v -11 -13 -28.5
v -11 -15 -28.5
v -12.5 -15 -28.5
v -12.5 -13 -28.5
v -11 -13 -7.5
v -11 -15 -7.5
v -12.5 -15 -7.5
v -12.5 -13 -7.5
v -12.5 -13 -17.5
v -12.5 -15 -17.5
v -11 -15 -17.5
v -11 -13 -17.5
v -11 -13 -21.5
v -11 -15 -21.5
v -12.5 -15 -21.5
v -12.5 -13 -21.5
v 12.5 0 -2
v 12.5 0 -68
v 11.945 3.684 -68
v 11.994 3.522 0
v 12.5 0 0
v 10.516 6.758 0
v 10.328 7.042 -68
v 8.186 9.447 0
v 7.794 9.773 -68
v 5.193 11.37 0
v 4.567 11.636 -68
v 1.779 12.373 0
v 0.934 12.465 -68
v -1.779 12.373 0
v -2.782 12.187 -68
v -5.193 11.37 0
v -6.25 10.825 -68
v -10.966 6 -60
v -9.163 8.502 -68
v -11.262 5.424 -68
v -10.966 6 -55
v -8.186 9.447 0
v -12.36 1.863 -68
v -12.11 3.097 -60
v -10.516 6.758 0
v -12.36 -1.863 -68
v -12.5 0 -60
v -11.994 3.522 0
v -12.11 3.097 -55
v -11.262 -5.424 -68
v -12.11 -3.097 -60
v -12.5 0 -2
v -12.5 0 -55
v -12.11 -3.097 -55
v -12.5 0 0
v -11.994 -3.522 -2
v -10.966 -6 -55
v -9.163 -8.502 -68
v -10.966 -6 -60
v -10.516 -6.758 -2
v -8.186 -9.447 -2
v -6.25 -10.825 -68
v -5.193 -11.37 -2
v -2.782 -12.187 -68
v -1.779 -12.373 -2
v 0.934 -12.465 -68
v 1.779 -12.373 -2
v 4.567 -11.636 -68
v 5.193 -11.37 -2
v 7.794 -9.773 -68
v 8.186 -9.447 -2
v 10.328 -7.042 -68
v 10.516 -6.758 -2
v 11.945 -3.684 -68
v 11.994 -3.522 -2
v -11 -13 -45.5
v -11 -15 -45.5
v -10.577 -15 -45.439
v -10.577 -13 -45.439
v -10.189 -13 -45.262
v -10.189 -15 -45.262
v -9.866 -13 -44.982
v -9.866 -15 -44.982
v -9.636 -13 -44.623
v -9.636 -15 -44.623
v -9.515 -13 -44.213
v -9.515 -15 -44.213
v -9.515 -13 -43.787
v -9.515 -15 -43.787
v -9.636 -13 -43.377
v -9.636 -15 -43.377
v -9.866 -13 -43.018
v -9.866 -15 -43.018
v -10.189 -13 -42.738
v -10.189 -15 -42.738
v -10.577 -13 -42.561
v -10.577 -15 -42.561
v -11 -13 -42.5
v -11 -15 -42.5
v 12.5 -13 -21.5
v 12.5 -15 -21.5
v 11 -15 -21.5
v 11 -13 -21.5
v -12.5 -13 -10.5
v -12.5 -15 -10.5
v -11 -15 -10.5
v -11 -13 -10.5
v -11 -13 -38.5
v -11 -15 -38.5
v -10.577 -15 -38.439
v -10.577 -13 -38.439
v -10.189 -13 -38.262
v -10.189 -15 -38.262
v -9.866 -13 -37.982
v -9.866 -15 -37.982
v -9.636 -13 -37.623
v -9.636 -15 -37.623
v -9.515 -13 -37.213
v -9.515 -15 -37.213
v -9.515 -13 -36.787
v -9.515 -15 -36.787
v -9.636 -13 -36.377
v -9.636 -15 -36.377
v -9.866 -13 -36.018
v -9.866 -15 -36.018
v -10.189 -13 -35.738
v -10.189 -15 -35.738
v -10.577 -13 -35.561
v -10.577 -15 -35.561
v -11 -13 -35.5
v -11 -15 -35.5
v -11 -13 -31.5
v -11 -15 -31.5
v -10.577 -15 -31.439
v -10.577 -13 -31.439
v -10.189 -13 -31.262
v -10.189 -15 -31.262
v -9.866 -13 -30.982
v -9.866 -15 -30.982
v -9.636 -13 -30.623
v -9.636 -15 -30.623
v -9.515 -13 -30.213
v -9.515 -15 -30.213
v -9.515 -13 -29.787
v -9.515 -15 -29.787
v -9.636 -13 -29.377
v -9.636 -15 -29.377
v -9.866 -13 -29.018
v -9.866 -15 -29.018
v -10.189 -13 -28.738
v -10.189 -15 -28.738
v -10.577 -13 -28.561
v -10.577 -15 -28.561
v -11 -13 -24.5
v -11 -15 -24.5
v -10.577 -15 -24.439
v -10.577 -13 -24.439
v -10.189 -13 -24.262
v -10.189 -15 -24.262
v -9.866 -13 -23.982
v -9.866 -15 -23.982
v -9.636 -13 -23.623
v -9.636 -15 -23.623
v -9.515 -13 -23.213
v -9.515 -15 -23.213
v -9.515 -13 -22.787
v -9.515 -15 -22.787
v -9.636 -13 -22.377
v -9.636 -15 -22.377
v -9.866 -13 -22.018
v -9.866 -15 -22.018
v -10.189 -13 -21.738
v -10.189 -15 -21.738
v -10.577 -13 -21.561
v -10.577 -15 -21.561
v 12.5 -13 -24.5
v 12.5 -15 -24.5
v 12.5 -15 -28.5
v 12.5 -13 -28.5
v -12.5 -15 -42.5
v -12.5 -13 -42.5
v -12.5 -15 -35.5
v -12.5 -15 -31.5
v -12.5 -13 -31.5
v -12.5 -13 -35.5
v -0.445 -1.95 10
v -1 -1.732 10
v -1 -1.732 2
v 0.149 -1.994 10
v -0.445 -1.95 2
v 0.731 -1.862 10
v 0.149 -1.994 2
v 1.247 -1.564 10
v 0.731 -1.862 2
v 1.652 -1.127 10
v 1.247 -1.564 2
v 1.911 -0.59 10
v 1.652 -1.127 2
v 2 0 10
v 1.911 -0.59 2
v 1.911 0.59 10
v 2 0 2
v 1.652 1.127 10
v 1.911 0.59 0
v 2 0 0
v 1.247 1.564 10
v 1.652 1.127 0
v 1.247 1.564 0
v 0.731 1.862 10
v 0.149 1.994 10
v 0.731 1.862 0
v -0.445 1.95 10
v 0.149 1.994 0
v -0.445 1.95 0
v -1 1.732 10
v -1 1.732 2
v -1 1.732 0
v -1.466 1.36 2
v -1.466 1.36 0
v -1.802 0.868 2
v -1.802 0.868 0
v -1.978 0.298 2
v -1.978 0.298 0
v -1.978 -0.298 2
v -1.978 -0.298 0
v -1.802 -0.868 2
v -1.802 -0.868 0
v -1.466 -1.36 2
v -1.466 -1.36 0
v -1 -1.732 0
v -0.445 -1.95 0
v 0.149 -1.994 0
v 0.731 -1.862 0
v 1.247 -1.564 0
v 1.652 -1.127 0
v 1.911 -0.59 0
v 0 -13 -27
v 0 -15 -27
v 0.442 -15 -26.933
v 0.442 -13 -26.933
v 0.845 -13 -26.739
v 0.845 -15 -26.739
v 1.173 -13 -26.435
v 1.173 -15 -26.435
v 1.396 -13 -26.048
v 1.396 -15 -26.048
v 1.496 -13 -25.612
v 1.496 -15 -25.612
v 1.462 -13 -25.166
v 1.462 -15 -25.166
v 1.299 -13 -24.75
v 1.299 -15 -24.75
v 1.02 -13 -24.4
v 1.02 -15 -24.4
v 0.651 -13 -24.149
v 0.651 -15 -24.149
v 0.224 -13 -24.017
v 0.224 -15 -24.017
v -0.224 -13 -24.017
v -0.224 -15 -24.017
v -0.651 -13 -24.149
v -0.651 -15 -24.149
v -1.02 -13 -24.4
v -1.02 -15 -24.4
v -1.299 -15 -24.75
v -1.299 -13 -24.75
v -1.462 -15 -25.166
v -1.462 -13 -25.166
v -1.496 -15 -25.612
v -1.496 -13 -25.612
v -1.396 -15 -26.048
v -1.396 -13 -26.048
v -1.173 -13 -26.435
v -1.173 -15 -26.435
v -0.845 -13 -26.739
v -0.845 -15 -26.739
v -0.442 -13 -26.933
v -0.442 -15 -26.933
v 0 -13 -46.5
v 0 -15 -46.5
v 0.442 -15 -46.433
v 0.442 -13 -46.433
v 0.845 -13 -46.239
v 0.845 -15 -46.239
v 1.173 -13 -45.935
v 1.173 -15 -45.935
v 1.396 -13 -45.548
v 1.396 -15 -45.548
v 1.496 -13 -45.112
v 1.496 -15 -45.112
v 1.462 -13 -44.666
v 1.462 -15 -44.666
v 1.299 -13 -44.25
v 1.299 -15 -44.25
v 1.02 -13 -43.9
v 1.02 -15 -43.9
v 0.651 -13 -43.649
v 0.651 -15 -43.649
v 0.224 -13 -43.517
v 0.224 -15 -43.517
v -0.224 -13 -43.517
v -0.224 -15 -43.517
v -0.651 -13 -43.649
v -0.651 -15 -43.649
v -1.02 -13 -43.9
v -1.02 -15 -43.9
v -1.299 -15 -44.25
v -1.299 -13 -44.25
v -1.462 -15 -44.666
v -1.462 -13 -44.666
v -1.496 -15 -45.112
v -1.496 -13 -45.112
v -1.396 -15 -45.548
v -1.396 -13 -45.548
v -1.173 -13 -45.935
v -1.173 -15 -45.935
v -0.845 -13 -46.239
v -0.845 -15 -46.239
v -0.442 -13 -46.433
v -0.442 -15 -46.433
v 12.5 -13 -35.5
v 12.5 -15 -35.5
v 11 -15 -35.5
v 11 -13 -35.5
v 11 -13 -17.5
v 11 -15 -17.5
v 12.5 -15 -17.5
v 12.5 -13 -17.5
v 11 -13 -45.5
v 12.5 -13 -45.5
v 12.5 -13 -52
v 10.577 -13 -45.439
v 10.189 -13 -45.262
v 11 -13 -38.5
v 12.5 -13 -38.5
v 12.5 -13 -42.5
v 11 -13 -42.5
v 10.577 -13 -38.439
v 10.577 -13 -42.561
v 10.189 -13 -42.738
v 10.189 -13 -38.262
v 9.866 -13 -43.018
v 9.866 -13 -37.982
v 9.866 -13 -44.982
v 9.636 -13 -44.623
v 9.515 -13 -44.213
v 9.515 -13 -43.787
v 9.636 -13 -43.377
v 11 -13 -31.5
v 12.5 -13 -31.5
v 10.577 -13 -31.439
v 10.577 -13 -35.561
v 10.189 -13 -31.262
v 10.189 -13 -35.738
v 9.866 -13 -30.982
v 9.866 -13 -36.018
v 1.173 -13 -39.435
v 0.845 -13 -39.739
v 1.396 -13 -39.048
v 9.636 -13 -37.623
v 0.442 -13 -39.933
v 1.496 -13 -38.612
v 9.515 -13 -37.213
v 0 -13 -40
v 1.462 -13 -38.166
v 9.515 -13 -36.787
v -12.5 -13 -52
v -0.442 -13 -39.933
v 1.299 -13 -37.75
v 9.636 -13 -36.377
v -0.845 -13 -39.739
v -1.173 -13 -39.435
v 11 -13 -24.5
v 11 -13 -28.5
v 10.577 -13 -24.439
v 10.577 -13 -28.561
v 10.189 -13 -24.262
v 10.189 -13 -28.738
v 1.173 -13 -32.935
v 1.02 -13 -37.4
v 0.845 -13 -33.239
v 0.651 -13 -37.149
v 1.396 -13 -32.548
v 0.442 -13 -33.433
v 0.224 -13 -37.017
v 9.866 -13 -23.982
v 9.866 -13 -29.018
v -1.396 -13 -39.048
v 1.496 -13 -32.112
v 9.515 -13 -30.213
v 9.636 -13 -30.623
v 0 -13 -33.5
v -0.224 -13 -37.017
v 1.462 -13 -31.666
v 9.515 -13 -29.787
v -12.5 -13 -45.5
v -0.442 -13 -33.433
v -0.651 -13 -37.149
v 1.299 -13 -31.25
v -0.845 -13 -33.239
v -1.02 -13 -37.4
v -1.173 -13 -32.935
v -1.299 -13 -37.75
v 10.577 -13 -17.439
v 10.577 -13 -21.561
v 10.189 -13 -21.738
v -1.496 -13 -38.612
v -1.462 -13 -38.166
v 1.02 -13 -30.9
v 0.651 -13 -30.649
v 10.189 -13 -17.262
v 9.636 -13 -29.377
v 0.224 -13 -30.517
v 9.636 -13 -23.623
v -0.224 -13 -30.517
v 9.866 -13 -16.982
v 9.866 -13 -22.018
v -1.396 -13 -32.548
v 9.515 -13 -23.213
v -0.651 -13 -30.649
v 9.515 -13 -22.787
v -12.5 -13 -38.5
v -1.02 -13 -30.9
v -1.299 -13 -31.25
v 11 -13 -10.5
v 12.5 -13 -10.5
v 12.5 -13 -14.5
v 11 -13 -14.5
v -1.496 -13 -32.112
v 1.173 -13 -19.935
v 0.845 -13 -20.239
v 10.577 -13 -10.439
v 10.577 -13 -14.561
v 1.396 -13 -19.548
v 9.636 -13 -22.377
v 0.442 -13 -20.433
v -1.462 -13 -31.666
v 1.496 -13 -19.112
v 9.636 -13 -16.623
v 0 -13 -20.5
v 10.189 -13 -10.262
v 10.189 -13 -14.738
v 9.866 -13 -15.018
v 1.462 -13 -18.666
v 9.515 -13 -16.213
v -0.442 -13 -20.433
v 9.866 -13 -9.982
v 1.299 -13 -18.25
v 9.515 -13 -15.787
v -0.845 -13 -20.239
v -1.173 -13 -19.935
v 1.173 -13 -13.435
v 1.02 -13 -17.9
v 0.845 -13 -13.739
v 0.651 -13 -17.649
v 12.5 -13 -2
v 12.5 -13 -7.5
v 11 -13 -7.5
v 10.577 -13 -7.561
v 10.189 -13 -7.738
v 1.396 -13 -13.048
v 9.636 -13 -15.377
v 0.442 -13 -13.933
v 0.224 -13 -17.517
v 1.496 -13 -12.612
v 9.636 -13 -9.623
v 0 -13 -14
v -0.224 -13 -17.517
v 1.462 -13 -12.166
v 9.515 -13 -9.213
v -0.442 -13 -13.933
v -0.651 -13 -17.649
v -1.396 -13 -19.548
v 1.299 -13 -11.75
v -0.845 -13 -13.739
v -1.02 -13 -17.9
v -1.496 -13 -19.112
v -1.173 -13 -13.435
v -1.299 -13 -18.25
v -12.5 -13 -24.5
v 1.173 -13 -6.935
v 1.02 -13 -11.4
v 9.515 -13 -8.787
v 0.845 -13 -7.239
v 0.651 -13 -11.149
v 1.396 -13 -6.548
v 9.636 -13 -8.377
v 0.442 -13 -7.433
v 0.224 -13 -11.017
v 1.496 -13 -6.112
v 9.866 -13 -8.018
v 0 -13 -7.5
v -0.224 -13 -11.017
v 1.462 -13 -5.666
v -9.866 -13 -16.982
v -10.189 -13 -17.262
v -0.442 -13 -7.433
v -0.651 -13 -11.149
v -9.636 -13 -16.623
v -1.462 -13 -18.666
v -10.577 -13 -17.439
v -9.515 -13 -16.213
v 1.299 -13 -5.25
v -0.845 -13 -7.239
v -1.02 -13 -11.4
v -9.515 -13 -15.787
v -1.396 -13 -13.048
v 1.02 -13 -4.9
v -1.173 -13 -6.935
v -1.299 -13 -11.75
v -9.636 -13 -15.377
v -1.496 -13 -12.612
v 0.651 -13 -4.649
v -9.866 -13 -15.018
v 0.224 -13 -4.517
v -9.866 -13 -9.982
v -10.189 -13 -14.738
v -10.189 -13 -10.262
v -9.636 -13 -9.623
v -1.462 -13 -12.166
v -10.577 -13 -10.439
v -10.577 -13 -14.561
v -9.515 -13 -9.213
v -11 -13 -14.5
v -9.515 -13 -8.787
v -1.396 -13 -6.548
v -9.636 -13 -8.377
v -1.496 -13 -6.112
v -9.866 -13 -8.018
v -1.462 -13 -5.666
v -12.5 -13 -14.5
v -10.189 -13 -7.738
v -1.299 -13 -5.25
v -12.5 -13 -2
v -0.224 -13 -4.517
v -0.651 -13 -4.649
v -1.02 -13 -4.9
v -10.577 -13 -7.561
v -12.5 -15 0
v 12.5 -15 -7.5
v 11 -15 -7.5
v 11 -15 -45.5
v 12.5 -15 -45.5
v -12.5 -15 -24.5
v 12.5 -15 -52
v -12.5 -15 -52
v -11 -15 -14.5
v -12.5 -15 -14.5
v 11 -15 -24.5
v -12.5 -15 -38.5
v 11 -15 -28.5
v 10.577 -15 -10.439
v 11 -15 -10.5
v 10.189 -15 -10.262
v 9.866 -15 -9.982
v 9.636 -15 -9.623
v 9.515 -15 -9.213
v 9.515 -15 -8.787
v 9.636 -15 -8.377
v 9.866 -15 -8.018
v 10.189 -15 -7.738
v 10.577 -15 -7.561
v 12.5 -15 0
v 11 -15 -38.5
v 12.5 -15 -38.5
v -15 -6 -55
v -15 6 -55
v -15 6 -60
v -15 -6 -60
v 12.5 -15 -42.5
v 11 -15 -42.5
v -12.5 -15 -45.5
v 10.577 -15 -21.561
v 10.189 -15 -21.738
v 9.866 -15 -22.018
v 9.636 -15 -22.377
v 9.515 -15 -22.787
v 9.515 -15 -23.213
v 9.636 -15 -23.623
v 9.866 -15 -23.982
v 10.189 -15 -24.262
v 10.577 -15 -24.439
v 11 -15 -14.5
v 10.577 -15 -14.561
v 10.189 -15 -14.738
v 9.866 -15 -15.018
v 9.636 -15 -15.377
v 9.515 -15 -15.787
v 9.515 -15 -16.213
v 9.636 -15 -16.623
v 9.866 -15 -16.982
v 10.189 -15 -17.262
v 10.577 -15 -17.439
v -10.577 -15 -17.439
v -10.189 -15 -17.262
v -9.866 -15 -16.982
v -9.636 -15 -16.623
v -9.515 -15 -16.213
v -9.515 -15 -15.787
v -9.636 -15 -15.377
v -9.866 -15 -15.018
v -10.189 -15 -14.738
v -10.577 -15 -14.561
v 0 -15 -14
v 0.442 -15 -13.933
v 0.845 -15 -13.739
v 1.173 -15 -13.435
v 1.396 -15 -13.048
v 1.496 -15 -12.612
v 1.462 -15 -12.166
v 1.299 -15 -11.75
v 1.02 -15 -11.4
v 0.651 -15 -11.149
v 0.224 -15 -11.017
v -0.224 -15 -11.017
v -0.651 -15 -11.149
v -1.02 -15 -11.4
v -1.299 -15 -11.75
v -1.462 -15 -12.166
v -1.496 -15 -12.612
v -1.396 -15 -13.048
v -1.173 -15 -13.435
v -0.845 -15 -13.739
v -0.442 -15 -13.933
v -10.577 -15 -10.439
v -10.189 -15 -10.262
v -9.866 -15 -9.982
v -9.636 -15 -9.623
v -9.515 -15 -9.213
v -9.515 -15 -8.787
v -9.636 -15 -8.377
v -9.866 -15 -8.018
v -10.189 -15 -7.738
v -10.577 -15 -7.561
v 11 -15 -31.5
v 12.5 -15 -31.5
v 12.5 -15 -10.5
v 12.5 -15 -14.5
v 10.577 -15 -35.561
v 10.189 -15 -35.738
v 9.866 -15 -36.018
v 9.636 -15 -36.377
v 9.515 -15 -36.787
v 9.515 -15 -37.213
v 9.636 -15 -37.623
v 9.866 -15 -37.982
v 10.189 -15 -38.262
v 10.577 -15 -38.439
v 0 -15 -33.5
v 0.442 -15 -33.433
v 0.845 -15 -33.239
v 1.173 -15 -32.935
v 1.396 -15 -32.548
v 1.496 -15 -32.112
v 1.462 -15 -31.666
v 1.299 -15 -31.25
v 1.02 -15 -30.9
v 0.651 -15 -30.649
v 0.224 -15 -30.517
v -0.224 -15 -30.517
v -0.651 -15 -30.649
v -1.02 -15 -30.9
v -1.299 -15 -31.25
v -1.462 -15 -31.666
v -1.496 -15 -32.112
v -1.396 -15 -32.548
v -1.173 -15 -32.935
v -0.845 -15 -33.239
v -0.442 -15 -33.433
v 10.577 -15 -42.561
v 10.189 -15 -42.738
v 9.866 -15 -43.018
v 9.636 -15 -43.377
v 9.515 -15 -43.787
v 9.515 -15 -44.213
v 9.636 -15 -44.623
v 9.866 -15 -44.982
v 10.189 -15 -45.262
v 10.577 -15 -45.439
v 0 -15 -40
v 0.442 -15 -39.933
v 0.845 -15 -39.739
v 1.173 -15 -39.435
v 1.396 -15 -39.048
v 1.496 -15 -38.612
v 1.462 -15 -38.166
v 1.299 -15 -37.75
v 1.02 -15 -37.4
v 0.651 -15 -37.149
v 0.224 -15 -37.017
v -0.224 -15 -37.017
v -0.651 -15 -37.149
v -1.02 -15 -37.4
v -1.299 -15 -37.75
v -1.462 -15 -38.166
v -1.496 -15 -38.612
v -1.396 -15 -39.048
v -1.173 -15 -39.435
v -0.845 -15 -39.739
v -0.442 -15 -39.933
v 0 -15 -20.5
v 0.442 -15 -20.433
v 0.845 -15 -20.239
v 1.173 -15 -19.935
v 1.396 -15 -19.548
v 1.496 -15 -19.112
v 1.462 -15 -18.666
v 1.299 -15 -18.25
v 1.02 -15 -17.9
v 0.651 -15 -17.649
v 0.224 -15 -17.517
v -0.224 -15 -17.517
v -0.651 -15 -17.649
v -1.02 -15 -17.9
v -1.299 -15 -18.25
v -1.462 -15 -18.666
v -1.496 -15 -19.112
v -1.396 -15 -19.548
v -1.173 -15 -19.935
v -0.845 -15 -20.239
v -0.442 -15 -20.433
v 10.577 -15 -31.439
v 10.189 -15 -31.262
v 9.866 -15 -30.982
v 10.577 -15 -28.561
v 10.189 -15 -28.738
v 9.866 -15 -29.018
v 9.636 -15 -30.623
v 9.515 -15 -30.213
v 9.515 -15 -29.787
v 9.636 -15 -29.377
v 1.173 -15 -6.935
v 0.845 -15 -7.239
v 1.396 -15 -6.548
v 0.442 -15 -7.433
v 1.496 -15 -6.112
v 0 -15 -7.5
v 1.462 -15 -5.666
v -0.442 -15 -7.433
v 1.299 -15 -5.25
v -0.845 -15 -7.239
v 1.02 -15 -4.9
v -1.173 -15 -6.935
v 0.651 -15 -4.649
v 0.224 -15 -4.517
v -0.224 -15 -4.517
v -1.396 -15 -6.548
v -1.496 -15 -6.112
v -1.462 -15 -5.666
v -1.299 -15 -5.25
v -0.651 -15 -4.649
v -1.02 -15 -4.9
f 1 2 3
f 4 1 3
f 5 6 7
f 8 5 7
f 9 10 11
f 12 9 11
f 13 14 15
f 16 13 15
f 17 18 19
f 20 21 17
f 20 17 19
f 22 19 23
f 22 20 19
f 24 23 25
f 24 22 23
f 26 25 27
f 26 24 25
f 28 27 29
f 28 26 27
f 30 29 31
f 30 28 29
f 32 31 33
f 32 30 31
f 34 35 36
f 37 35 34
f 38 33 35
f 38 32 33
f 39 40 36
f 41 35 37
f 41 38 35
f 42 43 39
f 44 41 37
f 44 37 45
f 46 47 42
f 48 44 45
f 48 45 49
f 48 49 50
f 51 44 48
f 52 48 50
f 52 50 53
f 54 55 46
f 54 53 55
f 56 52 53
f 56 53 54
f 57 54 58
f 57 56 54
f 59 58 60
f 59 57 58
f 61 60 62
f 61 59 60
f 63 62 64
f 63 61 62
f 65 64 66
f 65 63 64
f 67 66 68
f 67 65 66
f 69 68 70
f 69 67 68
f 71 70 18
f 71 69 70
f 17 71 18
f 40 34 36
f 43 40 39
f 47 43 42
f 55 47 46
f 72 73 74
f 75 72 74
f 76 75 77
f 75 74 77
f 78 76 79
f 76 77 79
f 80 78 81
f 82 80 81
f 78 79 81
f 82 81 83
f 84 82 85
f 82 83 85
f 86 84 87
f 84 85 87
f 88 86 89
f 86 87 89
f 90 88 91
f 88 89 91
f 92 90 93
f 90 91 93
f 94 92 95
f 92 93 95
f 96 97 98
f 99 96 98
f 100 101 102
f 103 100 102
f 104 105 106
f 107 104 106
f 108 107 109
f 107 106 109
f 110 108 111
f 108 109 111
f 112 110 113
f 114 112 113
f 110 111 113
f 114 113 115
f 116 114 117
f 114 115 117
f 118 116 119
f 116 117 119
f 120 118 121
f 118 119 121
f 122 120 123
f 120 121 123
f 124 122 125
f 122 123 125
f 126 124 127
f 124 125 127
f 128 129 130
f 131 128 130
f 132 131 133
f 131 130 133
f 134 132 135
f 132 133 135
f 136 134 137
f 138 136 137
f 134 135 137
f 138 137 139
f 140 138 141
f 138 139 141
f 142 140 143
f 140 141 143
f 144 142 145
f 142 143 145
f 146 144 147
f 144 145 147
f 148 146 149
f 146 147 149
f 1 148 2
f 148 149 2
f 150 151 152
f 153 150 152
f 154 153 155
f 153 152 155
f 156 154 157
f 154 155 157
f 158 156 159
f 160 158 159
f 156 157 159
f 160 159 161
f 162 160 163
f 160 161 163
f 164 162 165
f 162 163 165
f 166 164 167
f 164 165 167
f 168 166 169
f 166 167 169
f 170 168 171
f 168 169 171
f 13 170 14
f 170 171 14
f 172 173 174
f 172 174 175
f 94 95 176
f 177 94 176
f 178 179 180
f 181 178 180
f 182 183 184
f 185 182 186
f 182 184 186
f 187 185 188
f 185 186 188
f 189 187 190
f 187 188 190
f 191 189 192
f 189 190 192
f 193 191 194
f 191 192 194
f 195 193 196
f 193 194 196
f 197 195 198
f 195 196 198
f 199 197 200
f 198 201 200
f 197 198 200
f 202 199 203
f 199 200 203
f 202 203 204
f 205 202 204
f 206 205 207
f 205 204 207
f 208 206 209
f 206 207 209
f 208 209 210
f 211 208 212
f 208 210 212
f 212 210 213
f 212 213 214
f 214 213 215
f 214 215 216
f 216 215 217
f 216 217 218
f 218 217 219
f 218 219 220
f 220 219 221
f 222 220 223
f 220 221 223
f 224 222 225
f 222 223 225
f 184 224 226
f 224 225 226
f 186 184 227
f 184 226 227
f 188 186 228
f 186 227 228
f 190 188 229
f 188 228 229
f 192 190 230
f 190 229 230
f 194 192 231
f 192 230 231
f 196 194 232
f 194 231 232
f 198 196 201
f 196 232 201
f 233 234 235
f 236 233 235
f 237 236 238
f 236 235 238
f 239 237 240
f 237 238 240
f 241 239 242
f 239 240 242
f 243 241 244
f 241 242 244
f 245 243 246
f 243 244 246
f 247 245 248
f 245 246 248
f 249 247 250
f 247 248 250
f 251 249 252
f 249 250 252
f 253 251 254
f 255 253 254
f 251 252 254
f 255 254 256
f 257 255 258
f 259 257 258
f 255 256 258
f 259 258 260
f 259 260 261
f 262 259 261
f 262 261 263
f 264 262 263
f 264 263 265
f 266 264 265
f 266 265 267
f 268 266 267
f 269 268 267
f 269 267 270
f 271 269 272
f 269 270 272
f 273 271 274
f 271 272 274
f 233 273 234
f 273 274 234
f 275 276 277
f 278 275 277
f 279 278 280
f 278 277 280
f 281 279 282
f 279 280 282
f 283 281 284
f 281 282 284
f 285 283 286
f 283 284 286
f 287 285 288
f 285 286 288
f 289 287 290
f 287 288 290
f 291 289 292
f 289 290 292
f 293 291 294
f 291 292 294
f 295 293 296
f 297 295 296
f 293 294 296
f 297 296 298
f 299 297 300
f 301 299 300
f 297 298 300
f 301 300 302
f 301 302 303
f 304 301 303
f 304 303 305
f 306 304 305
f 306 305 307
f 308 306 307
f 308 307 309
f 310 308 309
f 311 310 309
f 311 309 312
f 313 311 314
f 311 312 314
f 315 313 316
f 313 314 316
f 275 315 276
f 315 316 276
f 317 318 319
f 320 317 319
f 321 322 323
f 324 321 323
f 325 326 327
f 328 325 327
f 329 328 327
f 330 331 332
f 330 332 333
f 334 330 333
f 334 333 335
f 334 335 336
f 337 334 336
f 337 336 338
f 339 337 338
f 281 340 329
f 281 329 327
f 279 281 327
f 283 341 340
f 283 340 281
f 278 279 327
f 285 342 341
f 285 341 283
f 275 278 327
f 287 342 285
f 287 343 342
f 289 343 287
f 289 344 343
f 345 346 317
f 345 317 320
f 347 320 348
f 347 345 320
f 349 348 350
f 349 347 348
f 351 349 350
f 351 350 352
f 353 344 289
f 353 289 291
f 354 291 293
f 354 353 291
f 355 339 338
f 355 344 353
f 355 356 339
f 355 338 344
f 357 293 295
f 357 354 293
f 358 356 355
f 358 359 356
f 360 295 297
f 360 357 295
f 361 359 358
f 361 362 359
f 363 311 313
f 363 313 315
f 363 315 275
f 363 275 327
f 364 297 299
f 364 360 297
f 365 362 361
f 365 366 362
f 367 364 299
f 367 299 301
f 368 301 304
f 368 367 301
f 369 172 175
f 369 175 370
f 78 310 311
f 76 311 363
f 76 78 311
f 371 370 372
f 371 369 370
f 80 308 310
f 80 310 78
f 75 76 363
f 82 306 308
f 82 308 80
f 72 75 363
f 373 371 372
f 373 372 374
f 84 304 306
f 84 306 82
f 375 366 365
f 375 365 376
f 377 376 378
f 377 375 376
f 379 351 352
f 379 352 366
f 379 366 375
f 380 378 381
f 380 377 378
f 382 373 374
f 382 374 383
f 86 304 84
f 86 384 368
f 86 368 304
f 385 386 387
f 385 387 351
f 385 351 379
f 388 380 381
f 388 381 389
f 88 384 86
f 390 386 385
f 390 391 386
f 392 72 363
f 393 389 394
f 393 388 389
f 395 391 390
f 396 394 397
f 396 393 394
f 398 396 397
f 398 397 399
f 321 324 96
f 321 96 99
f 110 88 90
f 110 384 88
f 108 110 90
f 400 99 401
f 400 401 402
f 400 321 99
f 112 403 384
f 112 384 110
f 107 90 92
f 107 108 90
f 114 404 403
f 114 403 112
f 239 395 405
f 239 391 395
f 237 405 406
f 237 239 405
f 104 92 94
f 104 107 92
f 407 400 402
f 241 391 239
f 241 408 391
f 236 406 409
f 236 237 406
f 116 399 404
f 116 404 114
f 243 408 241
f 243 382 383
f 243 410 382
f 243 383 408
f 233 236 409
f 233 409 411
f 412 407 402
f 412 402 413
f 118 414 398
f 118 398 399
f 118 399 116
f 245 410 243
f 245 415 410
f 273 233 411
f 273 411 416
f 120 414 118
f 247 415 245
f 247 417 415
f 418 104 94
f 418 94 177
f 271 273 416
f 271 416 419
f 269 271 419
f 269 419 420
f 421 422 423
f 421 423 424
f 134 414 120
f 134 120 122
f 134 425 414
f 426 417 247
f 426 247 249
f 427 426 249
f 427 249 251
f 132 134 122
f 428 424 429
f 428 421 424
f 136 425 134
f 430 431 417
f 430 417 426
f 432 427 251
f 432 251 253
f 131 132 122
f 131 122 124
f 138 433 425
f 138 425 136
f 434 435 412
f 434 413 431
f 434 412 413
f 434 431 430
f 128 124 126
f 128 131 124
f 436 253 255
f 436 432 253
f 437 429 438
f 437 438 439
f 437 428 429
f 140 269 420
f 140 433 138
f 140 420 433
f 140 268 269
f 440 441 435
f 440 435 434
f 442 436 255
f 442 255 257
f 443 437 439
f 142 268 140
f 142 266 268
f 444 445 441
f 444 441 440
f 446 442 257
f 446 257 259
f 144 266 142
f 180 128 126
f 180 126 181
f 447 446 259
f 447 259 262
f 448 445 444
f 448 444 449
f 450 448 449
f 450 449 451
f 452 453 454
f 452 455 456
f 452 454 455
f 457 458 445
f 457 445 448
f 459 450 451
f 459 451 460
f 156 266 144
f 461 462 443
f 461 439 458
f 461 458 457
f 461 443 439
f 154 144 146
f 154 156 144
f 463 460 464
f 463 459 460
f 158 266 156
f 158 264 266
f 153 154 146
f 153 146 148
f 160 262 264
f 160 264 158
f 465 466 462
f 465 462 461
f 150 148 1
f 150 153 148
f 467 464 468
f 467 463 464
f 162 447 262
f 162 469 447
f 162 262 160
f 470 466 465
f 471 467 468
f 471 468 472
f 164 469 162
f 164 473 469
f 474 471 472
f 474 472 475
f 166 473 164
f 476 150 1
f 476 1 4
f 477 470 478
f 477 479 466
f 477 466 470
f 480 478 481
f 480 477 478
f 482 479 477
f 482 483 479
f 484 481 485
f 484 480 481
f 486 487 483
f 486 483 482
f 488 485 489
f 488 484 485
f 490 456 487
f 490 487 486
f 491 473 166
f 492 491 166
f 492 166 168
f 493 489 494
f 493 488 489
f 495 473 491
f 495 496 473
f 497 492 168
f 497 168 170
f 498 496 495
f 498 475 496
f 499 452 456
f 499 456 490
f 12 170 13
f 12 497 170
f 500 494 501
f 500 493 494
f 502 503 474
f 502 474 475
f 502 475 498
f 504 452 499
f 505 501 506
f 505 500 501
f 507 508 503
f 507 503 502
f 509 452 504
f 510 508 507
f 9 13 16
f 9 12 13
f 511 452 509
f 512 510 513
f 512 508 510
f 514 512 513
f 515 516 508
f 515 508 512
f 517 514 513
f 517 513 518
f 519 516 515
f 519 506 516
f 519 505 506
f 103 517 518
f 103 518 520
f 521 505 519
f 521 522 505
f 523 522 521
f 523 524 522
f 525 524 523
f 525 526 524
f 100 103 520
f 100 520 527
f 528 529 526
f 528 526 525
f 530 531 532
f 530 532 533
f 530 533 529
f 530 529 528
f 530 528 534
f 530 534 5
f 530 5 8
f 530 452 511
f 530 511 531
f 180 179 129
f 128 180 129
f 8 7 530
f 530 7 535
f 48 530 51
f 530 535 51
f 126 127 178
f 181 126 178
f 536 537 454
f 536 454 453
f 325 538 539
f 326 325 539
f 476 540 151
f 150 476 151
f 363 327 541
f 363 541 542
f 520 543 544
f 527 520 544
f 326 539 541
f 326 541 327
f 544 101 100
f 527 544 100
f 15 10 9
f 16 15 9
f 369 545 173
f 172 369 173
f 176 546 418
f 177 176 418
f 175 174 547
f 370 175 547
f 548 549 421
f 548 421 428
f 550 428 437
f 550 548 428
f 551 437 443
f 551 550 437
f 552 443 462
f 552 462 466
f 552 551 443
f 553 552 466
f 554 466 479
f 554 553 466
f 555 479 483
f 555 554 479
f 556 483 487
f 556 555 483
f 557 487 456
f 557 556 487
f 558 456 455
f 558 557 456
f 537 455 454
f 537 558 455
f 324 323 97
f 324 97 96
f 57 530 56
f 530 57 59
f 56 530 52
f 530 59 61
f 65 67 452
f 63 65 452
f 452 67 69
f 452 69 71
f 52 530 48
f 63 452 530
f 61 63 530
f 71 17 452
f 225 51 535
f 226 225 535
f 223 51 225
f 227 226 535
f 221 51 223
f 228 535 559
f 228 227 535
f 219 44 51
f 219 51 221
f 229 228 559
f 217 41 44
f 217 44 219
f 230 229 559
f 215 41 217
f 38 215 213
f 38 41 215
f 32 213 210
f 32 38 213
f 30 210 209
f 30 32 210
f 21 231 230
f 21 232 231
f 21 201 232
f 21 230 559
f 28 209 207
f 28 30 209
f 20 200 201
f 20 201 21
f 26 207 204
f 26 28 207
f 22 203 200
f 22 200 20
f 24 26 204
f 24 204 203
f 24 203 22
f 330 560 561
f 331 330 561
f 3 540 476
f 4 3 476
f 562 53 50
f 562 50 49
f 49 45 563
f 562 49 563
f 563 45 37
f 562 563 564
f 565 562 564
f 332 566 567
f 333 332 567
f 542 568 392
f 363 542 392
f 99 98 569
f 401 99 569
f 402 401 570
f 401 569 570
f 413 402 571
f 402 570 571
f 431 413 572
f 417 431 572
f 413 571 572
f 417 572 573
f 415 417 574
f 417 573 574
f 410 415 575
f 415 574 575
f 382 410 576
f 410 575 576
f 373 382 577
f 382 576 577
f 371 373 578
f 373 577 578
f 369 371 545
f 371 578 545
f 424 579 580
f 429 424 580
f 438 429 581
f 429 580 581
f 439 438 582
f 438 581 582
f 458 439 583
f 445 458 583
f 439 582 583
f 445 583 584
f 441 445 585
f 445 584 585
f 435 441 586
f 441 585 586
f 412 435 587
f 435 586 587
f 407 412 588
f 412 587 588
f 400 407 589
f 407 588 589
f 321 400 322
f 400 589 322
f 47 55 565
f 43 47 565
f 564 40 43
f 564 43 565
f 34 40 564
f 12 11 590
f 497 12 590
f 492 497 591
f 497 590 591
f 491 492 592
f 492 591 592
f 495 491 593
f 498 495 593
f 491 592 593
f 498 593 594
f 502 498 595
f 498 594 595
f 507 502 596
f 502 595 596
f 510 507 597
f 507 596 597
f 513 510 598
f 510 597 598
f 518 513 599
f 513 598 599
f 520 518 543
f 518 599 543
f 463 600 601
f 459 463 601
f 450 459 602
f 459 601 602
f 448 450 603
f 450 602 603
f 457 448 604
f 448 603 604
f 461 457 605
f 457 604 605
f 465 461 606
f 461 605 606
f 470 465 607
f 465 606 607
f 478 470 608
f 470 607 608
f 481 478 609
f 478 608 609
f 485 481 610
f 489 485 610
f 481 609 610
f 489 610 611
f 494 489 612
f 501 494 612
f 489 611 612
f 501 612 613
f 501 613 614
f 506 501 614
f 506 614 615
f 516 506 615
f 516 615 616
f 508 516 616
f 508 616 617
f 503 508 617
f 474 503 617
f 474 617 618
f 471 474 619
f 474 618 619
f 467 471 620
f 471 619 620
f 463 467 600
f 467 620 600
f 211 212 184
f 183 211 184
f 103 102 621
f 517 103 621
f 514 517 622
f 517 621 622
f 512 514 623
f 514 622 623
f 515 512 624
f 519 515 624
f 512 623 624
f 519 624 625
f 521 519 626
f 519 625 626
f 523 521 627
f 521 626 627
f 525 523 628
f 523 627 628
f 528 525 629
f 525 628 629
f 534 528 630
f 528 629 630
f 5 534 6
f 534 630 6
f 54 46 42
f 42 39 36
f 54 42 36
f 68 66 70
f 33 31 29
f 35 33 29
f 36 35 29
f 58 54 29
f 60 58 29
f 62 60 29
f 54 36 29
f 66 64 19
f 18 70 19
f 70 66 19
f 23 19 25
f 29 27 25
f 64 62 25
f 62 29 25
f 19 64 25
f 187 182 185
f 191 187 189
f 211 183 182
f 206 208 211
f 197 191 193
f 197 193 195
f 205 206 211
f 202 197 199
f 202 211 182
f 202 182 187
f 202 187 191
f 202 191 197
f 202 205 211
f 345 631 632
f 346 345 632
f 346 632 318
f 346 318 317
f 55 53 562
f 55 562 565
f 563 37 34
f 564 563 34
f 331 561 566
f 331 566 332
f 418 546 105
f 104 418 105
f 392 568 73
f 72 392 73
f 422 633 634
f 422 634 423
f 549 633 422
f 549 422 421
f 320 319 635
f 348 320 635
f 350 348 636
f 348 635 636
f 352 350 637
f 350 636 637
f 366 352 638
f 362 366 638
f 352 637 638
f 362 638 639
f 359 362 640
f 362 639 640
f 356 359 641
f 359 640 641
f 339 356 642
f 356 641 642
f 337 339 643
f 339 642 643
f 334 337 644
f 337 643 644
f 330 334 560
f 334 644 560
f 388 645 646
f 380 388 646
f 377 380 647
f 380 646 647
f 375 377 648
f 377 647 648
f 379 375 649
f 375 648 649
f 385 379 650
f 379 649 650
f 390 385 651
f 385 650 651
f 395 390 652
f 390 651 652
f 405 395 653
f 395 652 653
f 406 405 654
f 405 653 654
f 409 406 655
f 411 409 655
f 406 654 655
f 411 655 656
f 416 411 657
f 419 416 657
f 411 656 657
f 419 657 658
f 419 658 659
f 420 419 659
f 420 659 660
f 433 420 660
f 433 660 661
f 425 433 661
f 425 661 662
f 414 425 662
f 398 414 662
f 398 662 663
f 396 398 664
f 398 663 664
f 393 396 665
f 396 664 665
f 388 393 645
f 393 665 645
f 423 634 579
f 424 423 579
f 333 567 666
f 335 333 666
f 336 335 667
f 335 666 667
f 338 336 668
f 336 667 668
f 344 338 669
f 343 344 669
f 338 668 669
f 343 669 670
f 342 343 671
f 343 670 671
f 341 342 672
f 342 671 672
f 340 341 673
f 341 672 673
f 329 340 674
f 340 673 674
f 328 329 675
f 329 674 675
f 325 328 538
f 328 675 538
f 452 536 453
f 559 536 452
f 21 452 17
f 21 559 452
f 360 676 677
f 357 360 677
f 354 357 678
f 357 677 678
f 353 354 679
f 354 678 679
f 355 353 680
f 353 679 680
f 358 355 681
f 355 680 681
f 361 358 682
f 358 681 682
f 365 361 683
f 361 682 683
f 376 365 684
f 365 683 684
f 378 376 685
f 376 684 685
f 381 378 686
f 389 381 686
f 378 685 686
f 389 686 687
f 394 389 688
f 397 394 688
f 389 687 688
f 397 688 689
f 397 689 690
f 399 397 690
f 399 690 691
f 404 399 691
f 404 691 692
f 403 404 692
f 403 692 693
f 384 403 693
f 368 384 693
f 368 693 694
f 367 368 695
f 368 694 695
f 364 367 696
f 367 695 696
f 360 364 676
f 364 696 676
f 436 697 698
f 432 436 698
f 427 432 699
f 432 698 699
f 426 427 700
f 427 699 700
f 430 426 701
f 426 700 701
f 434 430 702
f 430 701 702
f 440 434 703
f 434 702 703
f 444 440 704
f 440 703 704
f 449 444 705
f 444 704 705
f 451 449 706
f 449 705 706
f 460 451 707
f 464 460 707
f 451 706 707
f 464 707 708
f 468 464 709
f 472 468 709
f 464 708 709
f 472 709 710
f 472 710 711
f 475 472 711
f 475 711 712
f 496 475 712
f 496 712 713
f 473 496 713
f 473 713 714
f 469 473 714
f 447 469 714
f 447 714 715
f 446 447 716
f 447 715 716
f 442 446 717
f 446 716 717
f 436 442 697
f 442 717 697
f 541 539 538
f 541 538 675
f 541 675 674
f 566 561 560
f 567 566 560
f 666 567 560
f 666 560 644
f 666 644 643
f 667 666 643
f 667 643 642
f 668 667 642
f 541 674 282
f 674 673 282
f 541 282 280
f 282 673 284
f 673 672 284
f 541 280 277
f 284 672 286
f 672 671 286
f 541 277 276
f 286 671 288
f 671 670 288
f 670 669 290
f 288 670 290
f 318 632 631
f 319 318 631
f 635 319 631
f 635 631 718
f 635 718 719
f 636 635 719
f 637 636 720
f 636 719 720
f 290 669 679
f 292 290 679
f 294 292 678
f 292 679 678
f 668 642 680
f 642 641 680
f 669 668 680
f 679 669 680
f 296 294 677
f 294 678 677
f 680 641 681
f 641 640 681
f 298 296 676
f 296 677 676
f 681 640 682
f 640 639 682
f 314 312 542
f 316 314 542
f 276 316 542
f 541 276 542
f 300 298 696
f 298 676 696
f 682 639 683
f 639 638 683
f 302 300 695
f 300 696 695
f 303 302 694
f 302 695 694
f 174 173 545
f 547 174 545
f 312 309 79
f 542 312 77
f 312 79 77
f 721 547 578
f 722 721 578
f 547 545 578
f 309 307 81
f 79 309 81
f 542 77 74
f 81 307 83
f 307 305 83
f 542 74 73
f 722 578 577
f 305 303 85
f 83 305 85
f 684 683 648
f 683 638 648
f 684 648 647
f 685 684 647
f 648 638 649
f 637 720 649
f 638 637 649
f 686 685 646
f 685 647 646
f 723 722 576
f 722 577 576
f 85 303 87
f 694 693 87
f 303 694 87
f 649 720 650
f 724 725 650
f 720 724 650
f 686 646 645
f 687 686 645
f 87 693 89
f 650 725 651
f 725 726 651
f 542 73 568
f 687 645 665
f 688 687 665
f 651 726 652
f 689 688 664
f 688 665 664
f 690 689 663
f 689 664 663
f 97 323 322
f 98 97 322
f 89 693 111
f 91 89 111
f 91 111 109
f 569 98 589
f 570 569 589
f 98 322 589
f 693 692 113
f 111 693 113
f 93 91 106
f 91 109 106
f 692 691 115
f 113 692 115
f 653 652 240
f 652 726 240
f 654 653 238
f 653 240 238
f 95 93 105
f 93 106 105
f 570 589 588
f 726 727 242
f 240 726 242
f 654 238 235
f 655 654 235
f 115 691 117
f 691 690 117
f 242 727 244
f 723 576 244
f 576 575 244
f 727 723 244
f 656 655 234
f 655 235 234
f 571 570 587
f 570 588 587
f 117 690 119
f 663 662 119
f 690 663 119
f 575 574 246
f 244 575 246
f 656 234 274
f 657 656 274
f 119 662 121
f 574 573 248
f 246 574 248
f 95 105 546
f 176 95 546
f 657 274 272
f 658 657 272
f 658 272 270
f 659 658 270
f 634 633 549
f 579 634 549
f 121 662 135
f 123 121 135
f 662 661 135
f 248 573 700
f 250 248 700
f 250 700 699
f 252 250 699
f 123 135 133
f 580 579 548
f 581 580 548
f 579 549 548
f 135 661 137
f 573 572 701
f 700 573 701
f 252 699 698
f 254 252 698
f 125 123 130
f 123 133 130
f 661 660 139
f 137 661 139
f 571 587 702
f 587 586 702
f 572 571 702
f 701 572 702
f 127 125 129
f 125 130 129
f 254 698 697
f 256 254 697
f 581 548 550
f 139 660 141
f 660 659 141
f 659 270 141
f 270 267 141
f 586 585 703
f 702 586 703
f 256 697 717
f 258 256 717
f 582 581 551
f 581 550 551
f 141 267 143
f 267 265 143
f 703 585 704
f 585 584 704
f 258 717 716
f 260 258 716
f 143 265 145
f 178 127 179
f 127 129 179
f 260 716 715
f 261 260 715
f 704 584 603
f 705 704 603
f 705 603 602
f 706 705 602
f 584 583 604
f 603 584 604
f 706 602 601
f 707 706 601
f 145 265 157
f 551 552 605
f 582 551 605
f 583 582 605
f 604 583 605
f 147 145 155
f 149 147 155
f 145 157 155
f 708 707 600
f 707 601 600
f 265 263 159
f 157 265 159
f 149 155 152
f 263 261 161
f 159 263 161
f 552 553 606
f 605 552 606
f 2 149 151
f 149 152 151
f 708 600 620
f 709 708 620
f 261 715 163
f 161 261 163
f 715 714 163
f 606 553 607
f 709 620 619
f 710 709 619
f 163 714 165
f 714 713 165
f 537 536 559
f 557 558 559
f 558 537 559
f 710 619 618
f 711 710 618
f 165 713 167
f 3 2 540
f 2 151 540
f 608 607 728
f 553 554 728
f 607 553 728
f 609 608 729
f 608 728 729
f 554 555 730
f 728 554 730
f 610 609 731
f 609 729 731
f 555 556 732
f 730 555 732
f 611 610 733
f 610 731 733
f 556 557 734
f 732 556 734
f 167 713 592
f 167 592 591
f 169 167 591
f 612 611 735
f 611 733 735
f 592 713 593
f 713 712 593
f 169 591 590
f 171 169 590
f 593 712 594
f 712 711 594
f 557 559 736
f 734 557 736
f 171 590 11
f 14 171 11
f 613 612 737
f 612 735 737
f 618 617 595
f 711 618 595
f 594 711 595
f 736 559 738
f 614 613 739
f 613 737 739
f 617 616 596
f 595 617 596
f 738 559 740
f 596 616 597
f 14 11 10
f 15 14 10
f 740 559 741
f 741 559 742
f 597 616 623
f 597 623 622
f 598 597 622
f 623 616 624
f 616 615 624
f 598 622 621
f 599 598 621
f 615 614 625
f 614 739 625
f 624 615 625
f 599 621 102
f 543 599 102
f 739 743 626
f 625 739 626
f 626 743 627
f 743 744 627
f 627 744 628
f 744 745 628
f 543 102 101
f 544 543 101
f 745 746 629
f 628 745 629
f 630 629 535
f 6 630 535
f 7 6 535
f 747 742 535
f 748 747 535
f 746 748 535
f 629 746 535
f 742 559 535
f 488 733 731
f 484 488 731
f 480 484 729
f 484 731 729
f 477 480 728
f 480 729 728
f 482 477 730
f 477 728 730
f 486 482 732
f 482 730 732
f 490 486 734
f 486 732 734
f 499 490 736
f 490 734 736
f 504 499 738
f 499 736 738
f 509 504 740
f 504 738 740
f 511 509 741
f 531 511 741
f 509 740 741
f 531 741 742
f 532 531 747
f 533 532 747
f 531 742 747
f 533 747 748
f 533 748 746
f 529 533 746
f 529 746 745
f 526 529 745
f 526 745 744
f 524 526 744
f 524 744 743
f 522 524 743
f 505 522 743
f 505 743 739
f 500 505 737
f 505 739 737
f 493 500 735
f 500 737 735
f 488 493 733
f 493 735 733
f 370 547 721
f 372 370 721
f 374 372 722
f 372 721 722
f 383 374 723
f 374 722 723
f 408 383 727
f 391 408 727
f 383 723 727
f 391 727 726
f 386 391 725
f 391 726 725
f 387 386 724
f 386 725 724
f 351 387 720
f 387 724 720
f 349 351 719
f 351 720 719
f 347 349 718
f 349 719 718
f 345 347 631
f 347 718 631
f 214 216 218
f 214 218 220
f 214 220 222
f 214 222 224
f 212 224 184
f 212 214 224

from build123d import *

# Parameters (mm, degrees)
SKETCH1_R           = 12.5
BOSS_EXTRUDE1_DEPTH = 68
SKETCH3_R           = 2
BOSS_EXTRUDE3_DEPTH = 2
BOSS_EXTRUDE2_DEPTH = 8
BOSS_EXTRUDE4_DEPTH = 2
SKETCH5_W           = 25
SKETCH5_H           = 2
BOSS_EXTRUDE5_DEPTH = 50
SKETCH6_R           = 1.5
CUT_EXTRUDE1_DEPTH  = 2
SKETCH7_W           = 5
SKETCH7_H           = 12
BOSS_EXTRUDE6_DEPTH = 15


with BuildPart() as part:
    # Sketch1 → Boss-Extrude1 (new body)
    with BuildSketch(Plane.XY):
        Circle(SKETCH1_R)
    extrude(amount=-BOSS_EXTRUDE1_DEPTH)

    # Sketch3 → Boss-Extrude3 (add)
    with BuildSketch(Plane.XY):
        Circle(SKETCH3_R)
    extrude(amount=BOSS_EXTRUDE3_DEPTH)

    # Sketch2 → Boss-Extrude2 (add)
    with BuildSketch(Plane.XY.offset(2)):
        with BuildLine():
            Line((-1, 1.732050808), (-1, -1.732050808))
            ThreePointArc((-1, -1.732050808), (2, 0), (-1, 1.732050808))
        make_face()
    extrude(amount=BOSS_EXTRUDE2_DEPTH)

    # Sketch4 → Boss-Extrude4 (add)
    with BuildSketch(Plane.XY):
        with BuildLine():
            Line((-12.5, 0), (-12.5, -15))
            Line((-12.5, -15), (12.5, -15))
            Line((12.5, -15), (12.5, 0))
            ThreePointArc((12.5, 0), (0, -12.5), (-12.5, 0))
        make_face()
    extrude(amount=-BOSS_EXTRUDE4_DEPTH)

    # Sketch5 → Boss-Extrude5 (add)
    with BuildSketch(Plane(origin=(0, 0, -2), x_dir=(-1, 0, 0), z_dir=(0, 0, -1))):
        with Locations((0, -14)):
            Rectangle(SKETCH5_W, SKETCH5_H)
    extrude(amount=BOSS_EXTRUDE5_DEPTH)

    # Sketch6 → Cut-Extrude1 (cut)
    with BuildSketch(Plane.XZ.offset(15)):
        with Locations(Location((0, -6, 0), (0, 0, 270))):
            Circle(SKETCH6_R)
        with Locations(Location((0, -12.5, 0), (0, 0, 270))):
            Circle(SKETCH6_R)
        with Locations(Location((0, -19, 0), (0, 0, 270))):
            Circle(SKETCH6_R)
        with Locations(Location((0, -25.5, 0), (0, 0, 270))):
            Circle(SKETCH6_R)
        with Locations(Location((0, -32, 0), (0, 0, 270))):
            Circle(SKETCH6_R)
        with Locations(Location((0, -38.5, 0), (0, 0, 270))):
            Circle(SKETCH6_R)
        with Locations(Location((0, -45, 0), (0, 0, 270))):
            Circle(SKETCH6_R)
        with BuildLine():
            Line((-11, -7.5), (-12.5, -7.5))
            Line((-12.5, -7.5), (-12.5, -10.5))
            Line((-12.5, -10.5), (-11, -10.5))
            ThreePointArc((-11, -10.5), (-9.5, -9), (-11, -7.5))
        make_face()
        with BuildLine():
            Line((-11, -14.5), (-12.5, -14.5))
            Line((-12.5, -14.5), (-12.5, -17.5))
            Line((-12.5, -17.5), (-11, -17.5))
            ThreePointArc((-11, -17.5), (-9.5, -16), (-11, -14.5))
        make_face()
        with BuildLine():
            Line((-11, -21.5), (-12.5, -21.5))
            Line((-12.5, -21.5), (-12.5, -24.5))
            Line((-12.5, -24.5), (-11, -24.5))
            ThreePointArc((-11, -24.5), (-9.5, -23), (-11, -21.5))
        make_face()
        with BuildLine():
            Line((-11, -28.5), (-12.5, -28.5))
            Line((-12.5, -28.5), (-12.5, -31.5))
            Line((-12.5, -31.5), (-11, -31.5))
            ThreePointArc((-11, -31.5), (-9.5, -30), (-11, -28.5))
        make_face()
        with BuildLine():
            Line((-11, -35.5), (-12.5, -35.5))
            Line((-12.5, -35.5), (-12.5, -38.5))
            Line((-12.5, -38.5), (-11, -38.5))
            ThreePointArc((-11, -38.5), (-9.5, -37), (-11, -35.5))
        make_face()
        with BuildLine():
            Line((-11, -42.5), (-12.5, -42.5))
            Line((-12.5, -42.5), (-12.5, -45.5))
            Line((-12.5, -45.5), (-11, -45.5))
            ThreePointArc((-11, -45.5), (-9.5, -44), (-11, -42.5))
        make_face()
        with BuildLine():
            Line((11, -45.5), (12.5, -45.5))
            Line((12.5, -45.5), (12.5, -42.5))
            Line((12.5, -42.5), (11, -42.5))
            ThreePointArc((11, -42.5), (9.5, -44), (11, -45.5))
        make_face()
        with BuildLine():
            Line((11, -38.5), (12.5, -38.5))
            Line((12.5, -38.5), (12.5, -35.5))
            Line((12.5, -35.5), (11, -35.5))
            ThreePointArc((11, -35.5), (9.5, -37), (11, -38.5))
        make_face()
        with BuildLine():
            Line((11, -31.5), (12.5, -31.5))
            Line((12.5, -31.5), (12.5, -28.5))
            Line((12.5, -28.5), (11, -28.5))
            ThreePointArc((11, -28.5), (9.5, -30), (11, -31.5))
        make_face()
        with BuildLine():
            Line((11, -24.5), (12.5, -24.5))
            Line((12.5, -24.5), (12.5, -21.5))
            Line((12.5, -21.5), (11, -21.5))
            ThreePointArc((11, -21.5), (9.5, -23), (11, -24.5))
        make_face()
        with BuildLine():
            Line((11, -17.5), (12.5, -17.5))
            Line((12.5, -17.5), (12.5, -14.5))
            Line((12.5, -14.5), (11, -14.5))
            ThreePointArc((11, -14.5), (9.5, -16), (11, -17.5))
        make_face()
        with BuildLine():
            Line((11, -7.5), (12.5, -7.5))
            Line((12.5, -7.5), (12.5, -10.5))
            Line((12.5, -10.5), (11, -10.5))
            ThreePointArc((11, -10.5), (9.5, -9), (11, -7.5))
        make_face()
    extrude(amount=-CUT_EXTRUDE1_DEPTH, mode=Mode.SUBTRACT)

    # Sketch7 → Boss-Extrude6 (add)
    with BuildSketch(Plane(origin=(0, 0, 0), x_dir=(0, 0, -1), z_dir=(1, 0, 0))):
        with Locations((57.5, 0)):
            Rectangle(SKETCH7_W, SKETCH7_H)
    extrude(amount=-BOSS_EXTRUDE6_DEPTH)


solid = part.part
